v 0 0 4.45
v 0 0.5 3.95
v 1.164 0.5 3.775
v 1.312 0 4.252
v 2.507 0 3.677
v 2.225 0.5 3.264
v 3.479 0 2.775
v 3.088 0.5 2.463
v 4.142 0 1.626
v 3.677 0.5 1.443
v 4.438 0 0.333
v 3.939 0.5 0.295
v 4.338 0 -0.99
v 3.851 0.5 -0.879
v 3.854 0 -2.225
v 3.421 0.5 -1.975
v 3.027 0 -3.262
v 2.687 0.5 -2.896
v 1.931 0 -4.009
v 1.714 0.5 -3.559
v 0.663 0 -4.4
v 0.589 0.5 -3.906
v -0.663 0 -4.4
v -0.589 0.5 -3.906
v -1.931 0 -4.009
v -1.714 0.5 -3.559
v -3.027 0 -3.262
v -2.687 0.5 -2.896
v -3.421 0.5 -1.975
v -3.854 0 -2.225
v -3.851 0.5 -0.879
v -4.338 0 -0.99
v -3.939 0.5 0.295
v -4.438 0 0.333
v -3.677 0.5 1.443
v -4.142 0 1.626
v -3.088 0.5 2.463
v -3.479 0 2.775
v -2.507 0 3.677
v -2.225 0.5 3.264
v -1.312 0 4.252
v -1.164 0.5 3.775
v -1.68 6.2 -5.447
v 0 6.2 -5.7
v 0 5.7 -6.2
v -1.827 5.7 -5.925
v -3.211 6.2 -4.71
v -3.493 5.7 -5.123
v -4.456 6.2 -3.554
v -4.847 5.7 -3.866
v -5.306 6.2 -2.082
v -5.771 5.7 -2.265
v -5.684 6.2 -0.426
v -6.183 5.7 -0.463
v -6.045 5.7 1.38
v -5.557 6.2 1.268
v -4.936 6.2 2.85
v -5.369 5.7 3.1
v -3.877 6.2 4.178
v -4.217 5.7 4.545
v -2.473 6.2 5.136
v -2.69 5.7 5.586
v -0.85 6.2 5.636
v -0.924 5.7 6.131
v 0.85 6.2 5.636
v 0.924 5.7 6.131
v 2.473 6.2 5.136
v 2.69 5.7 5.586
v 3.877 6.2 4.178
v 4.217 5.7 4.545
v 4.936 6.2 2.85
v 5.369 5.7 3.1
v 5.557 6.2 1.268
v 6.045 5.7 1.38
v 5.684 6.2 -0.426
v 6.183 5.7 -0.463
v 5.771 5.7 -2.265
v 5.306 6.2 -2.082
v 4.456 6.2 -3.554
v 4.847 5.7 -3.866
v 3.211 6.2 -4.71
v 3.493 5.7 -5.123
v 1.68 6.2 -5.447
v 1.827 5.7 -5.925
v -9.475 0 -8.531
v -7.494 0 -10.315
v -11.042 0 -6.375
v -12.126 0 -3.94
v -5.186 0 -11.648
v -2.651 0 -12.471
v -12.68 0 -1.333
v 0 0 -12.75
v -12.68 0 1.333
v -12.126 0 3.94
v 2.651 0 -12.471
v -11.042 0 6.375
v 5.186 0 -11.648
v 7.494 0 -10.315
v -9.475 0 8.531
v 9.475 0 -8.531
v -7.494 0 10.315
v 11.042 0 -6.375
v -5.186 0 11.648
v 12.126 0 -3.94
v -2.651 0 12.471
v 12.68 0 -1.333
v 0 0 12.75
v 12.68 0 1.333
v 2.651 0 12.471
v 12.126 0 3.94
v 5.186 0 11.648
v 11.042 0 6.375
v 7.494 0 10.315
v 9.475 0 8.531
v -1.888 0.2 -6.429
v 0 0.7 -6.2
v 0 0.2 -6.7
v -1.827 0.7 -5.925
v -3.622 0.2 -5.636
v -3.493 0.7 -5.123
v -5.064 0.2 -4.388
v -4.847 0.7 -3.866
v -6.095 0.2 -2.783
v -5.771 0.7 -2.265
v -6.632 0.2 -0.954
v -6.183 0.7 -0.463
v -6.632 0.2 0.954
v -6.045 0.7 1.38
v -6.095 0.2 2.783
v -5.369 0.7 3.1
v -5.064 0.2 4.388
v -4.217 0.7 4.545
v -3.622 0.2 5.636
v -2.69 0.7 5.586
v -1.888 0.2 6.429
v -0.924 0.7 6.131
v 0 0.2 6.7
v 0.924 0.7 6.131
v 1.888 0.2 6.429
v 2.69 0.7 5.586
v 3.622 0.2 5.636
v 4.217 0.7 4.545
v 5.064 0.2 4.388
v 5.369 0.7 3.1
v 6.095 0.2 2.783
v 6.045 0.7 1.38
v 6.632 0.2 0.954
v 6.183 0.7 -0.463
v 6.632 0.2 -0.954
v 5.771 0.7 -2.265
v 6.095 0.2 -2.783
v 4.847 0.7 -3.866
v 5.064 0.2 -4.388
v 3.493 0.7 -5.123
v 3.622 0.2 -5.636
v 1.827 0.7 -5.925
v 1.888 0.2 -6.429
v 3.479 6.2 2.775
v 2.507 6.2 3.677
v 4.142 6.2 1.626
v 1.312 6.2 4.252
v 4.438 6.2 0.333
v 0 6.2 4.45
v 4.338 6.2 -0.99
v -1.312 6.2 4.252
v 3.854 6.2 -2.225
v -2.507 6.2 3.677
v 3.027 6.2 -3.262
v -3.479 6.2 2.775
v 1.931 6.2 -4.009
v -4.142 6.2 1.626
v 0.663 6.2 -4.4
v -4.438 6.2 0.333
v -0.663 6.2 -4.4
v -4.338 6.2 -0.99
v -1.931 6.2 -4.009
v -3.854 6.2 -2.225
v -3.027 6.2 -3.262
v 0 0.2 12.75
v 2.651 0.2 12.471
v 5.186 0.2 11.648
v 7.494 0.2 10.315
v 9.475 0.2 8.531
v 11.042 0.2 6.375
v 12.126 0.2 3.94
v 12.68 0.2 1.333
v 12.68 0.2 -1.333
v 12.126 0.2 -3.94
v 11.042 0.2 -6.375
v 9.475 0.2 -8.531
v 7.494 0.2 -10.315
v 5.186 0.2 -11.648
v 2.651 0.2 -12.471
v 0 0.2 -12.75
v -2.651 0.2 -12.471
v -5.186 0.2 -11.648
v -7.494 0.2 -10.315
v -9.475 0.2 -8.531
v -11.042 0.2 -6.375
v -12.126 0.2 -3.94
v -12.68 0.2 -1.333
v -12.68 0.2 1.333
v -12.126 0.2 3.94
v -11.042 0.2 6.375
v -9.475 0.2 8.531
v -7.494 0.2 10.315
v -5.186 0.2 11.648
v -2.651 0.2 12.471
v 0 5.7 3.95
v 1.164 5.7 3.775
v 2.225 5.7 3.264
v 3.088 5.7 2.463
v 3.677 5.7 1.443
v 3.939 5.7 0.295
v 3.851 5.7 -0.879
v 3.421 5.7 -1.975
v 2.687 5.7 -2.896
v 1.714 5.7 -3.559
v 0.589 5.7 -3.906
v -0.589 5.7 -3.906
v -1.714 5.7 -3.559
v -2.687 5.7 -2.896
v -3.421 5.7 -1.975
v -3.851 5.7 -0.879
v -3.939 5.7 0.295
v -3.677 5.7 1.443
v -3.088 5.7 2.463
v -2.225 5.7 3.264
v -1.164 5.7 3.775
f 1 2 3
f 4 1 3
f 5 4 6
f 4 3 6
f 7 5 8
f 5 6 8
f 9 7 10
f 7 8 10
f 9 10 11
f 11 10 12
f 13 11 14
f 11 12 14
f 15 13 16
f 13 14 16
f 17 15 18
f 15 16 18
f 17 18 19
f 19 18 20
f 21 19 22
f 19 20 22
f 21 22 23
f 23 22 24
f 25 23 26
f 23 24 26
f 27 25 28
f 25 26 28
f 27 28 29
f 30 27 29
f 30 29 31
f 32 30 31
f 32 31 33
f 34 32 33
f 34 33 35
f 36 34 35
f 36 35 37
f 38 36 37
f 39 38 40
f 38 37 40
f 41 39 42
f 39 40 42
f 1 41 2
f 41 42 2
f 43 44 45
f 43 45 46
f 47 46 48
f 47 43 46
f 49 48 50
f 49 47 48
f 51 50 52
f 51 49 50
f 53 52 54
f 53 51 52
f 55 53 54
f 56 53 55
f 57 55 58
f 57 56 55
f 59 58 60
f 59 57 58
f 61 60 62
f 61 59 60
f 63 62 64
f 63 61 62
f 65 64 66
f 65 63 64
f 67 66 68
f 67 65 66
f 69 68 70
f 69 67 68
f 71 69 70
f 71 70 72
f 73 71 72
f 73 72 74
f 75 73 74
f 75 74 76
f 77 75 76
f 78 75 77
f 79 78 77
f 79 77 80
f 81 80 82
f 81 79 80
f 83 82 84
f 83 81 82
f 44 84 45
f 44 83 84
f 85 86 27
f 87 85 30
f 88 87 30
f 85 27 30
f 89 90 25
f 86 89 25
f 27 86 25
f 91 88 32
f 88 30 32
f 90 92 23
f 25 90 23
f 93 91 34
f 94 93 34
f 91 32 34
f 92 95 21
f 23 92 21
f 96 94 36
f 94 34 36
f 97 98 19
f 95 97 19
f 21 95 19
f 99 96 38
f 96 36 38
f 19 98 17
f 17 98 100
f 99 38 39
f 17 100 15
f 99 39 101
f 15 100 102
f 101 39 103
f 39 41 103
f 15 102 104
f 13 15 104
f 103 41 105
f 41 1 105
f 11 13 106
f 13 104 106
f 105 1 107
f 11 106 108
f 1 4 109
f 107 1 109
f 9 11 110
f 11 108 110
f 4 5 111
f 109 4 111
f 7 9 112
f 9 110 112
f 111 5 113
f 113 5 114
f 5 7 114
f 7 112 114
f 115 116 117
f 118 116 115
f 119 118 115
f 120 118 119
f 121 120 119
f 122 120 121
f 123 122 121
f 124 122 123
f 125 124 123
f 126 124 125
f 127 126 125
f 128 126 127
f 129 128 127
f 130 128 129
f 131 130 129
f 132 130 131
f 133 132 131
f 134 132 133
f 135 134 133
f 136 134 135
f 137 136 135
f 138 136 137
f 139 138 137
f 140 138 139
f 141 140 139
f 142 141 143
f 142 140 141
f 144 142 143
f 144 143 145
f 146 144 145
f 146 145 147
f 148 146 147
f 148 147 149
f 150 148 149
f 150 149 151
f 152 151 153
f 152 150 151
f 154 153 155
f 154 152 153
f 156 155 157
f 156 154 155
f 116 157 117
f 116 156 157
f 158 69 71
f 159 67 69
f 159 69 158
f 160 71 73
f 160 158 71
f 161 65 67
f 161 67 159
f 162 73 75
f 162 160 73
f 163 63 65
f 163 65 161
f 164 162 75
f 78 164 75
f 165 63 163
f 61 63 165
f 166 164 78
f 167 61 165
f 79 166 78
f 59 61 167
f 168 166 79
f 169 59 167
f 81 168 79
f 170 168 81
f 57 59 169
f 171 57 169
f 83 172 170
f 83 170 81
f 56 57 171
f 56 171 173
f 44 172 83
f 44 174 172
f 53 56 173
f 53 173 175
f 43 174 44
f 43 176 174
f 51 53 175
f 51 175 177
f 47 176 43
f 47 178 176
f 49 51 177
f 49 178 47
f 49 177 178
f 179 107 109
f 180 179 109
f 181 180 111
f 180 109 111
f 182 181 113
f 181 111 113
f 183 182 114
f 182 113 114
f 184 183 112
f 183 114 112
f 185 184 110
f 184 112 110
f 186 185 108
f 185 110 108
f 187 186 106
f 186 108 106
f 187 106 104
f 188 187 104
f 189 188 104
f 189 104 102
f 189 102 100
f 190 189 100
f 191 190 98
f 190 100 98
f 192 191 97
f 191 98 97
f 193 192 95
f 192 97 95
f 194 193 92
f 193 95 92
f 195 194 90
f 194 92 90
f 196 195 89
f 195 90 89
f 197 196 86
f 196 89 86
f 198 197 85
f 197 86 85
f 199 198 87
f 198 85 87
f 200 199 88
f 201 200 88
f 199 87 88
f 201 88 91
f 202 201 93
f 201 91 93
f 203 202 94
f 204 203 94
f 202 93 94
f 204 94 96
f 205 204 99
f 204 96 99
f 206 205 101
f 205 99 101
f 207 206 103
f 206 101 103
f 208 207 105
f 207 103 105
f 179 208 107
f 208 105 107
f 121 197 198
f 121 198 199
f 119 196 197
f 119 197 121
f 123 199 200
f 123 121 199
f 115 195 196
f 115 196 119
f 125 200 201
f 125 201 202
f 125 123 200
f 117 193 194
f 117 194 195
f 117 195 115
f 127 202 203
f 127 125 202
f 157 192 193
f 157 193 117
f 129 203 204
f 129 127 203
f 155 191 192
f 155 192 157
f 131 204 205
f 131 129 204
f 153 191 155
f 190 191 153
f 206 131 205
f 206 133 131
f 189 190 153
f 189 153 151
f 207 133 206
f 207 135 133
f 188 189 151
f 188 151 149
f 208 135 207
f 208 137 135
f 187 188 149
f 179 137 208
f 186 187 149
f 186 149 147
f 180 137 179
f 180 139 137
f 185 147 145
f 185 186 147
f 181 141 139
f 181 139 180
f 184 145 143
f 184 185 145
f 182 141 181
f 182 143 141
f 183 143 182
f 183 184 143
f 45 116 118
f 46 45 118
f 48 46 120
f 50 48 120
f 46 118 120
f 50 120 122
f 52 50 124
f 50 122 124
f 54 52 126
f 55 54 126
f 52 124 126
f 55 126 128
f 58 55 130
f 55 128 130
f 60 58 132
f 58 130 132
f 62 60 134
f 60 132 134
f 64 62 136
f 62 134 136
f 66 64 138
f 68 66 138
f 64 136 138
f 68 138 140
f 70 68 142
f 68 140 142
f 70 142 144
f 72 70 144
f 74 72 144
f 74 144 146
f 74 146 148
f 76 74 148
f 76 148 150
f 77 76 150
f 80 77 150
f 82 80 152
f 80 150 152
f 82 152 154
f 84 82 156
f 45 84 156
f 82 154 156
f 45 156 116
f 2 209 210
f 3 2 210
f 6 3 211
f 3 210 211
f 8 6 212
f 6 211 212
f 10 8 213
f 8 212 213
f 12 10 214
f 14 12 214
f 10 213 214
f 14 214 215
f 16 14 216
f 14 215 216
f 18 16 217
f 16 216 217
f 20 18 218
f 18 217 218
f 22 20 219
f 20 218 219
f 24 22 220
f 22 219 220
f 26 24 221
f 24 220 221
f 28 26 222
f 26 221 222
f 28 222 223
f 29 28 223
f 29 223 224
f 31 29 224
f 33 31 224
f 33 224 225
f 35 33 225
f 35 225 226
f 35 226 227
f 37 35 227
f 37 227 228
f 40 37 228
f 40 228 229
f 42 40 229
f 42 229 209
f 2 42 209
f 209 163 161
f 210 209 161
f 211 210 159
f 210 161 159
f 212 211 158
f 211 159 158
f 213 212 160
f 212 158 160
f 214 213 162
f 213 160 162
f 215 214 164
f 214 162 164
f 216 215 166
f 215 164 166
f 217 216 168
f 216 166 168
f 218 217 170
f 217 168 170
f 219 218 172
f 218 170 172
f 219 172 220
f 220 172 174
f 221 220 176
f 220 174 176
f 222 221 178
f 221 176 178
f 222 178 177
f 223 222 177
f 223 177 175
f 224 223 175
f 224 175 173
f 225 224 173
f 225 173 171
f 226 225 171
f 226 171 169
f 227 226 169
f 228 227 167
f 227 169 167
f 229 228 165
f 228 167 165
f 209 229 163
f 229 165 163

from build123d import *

# Parameters (mm, degrees)
SKETCH_1_R          = 12.75
EXTRUDE_1_DEPTH     = 0.2
SKETCH_2_R          = 6.2
EXTRUDE_2_DEPTH     = 6
SKETCH_3_R          = 3.95
CUT_EXTRUDE_1_DEPTH = 20.067380523
CHAMFER_1_SIZE      = 0.5


with BuildPart() as part:
    # Эскиз1 → Бобышка-Вытянуть1 (new body)
    with BuildSketch(Plane(origin=(0, 0, 0), x_dir=(1, 0, 0), z_dir=(0, 1, 0))):
        with Locations(Location((0, 0, 0), (0, 0, 270))):
            Circle(SKETCH_1_R)
    extrude(amount=EXTRUDE_1_DEPTH)

    # Эскиз2 → Бобышка-Вытянуть2 (add)
    with BuildSketch(Plane(origin=(0, 0.2, 0), x_dir=(1, 0, 0), z_dir=(0, 1, 0))):
        with Locations(Location((0, 0, 0), (0, 0, 90))):
            Circle(SKETCH_2_R)
    extrude(amount=EXTRUDE_2_DEPTH)

    # Эскиз3 → Вырез-Вытянуть1 (cut, through all)
    with BuildSketch(Plane(origin=(0, 6.2, 0), x_dir=(1, 0, 0), z_dir=(0, 1, 0))):
        with Locations(Location((0, 0, 0), (0, 0, 270))):
            Circle(SKETCH_3_R)
    extrude(amount=-CUT_EXTRUDE_1_DEPTH, mode=Mode.SUBTRACT)

    # Фаска1
    chamfer_1_edges = [part.edges().sort_by_distance(p)[0] for p in [
        (0, 0, -3.95),
        (0, 6.2, -3.95),
        (0, 0.2, 6.2),
        (0, 6.2, 6.2),
    ]]
    chamfer(chamfer_1_edges, length=CHAMFER_1_SIZE)


solid = part.part
